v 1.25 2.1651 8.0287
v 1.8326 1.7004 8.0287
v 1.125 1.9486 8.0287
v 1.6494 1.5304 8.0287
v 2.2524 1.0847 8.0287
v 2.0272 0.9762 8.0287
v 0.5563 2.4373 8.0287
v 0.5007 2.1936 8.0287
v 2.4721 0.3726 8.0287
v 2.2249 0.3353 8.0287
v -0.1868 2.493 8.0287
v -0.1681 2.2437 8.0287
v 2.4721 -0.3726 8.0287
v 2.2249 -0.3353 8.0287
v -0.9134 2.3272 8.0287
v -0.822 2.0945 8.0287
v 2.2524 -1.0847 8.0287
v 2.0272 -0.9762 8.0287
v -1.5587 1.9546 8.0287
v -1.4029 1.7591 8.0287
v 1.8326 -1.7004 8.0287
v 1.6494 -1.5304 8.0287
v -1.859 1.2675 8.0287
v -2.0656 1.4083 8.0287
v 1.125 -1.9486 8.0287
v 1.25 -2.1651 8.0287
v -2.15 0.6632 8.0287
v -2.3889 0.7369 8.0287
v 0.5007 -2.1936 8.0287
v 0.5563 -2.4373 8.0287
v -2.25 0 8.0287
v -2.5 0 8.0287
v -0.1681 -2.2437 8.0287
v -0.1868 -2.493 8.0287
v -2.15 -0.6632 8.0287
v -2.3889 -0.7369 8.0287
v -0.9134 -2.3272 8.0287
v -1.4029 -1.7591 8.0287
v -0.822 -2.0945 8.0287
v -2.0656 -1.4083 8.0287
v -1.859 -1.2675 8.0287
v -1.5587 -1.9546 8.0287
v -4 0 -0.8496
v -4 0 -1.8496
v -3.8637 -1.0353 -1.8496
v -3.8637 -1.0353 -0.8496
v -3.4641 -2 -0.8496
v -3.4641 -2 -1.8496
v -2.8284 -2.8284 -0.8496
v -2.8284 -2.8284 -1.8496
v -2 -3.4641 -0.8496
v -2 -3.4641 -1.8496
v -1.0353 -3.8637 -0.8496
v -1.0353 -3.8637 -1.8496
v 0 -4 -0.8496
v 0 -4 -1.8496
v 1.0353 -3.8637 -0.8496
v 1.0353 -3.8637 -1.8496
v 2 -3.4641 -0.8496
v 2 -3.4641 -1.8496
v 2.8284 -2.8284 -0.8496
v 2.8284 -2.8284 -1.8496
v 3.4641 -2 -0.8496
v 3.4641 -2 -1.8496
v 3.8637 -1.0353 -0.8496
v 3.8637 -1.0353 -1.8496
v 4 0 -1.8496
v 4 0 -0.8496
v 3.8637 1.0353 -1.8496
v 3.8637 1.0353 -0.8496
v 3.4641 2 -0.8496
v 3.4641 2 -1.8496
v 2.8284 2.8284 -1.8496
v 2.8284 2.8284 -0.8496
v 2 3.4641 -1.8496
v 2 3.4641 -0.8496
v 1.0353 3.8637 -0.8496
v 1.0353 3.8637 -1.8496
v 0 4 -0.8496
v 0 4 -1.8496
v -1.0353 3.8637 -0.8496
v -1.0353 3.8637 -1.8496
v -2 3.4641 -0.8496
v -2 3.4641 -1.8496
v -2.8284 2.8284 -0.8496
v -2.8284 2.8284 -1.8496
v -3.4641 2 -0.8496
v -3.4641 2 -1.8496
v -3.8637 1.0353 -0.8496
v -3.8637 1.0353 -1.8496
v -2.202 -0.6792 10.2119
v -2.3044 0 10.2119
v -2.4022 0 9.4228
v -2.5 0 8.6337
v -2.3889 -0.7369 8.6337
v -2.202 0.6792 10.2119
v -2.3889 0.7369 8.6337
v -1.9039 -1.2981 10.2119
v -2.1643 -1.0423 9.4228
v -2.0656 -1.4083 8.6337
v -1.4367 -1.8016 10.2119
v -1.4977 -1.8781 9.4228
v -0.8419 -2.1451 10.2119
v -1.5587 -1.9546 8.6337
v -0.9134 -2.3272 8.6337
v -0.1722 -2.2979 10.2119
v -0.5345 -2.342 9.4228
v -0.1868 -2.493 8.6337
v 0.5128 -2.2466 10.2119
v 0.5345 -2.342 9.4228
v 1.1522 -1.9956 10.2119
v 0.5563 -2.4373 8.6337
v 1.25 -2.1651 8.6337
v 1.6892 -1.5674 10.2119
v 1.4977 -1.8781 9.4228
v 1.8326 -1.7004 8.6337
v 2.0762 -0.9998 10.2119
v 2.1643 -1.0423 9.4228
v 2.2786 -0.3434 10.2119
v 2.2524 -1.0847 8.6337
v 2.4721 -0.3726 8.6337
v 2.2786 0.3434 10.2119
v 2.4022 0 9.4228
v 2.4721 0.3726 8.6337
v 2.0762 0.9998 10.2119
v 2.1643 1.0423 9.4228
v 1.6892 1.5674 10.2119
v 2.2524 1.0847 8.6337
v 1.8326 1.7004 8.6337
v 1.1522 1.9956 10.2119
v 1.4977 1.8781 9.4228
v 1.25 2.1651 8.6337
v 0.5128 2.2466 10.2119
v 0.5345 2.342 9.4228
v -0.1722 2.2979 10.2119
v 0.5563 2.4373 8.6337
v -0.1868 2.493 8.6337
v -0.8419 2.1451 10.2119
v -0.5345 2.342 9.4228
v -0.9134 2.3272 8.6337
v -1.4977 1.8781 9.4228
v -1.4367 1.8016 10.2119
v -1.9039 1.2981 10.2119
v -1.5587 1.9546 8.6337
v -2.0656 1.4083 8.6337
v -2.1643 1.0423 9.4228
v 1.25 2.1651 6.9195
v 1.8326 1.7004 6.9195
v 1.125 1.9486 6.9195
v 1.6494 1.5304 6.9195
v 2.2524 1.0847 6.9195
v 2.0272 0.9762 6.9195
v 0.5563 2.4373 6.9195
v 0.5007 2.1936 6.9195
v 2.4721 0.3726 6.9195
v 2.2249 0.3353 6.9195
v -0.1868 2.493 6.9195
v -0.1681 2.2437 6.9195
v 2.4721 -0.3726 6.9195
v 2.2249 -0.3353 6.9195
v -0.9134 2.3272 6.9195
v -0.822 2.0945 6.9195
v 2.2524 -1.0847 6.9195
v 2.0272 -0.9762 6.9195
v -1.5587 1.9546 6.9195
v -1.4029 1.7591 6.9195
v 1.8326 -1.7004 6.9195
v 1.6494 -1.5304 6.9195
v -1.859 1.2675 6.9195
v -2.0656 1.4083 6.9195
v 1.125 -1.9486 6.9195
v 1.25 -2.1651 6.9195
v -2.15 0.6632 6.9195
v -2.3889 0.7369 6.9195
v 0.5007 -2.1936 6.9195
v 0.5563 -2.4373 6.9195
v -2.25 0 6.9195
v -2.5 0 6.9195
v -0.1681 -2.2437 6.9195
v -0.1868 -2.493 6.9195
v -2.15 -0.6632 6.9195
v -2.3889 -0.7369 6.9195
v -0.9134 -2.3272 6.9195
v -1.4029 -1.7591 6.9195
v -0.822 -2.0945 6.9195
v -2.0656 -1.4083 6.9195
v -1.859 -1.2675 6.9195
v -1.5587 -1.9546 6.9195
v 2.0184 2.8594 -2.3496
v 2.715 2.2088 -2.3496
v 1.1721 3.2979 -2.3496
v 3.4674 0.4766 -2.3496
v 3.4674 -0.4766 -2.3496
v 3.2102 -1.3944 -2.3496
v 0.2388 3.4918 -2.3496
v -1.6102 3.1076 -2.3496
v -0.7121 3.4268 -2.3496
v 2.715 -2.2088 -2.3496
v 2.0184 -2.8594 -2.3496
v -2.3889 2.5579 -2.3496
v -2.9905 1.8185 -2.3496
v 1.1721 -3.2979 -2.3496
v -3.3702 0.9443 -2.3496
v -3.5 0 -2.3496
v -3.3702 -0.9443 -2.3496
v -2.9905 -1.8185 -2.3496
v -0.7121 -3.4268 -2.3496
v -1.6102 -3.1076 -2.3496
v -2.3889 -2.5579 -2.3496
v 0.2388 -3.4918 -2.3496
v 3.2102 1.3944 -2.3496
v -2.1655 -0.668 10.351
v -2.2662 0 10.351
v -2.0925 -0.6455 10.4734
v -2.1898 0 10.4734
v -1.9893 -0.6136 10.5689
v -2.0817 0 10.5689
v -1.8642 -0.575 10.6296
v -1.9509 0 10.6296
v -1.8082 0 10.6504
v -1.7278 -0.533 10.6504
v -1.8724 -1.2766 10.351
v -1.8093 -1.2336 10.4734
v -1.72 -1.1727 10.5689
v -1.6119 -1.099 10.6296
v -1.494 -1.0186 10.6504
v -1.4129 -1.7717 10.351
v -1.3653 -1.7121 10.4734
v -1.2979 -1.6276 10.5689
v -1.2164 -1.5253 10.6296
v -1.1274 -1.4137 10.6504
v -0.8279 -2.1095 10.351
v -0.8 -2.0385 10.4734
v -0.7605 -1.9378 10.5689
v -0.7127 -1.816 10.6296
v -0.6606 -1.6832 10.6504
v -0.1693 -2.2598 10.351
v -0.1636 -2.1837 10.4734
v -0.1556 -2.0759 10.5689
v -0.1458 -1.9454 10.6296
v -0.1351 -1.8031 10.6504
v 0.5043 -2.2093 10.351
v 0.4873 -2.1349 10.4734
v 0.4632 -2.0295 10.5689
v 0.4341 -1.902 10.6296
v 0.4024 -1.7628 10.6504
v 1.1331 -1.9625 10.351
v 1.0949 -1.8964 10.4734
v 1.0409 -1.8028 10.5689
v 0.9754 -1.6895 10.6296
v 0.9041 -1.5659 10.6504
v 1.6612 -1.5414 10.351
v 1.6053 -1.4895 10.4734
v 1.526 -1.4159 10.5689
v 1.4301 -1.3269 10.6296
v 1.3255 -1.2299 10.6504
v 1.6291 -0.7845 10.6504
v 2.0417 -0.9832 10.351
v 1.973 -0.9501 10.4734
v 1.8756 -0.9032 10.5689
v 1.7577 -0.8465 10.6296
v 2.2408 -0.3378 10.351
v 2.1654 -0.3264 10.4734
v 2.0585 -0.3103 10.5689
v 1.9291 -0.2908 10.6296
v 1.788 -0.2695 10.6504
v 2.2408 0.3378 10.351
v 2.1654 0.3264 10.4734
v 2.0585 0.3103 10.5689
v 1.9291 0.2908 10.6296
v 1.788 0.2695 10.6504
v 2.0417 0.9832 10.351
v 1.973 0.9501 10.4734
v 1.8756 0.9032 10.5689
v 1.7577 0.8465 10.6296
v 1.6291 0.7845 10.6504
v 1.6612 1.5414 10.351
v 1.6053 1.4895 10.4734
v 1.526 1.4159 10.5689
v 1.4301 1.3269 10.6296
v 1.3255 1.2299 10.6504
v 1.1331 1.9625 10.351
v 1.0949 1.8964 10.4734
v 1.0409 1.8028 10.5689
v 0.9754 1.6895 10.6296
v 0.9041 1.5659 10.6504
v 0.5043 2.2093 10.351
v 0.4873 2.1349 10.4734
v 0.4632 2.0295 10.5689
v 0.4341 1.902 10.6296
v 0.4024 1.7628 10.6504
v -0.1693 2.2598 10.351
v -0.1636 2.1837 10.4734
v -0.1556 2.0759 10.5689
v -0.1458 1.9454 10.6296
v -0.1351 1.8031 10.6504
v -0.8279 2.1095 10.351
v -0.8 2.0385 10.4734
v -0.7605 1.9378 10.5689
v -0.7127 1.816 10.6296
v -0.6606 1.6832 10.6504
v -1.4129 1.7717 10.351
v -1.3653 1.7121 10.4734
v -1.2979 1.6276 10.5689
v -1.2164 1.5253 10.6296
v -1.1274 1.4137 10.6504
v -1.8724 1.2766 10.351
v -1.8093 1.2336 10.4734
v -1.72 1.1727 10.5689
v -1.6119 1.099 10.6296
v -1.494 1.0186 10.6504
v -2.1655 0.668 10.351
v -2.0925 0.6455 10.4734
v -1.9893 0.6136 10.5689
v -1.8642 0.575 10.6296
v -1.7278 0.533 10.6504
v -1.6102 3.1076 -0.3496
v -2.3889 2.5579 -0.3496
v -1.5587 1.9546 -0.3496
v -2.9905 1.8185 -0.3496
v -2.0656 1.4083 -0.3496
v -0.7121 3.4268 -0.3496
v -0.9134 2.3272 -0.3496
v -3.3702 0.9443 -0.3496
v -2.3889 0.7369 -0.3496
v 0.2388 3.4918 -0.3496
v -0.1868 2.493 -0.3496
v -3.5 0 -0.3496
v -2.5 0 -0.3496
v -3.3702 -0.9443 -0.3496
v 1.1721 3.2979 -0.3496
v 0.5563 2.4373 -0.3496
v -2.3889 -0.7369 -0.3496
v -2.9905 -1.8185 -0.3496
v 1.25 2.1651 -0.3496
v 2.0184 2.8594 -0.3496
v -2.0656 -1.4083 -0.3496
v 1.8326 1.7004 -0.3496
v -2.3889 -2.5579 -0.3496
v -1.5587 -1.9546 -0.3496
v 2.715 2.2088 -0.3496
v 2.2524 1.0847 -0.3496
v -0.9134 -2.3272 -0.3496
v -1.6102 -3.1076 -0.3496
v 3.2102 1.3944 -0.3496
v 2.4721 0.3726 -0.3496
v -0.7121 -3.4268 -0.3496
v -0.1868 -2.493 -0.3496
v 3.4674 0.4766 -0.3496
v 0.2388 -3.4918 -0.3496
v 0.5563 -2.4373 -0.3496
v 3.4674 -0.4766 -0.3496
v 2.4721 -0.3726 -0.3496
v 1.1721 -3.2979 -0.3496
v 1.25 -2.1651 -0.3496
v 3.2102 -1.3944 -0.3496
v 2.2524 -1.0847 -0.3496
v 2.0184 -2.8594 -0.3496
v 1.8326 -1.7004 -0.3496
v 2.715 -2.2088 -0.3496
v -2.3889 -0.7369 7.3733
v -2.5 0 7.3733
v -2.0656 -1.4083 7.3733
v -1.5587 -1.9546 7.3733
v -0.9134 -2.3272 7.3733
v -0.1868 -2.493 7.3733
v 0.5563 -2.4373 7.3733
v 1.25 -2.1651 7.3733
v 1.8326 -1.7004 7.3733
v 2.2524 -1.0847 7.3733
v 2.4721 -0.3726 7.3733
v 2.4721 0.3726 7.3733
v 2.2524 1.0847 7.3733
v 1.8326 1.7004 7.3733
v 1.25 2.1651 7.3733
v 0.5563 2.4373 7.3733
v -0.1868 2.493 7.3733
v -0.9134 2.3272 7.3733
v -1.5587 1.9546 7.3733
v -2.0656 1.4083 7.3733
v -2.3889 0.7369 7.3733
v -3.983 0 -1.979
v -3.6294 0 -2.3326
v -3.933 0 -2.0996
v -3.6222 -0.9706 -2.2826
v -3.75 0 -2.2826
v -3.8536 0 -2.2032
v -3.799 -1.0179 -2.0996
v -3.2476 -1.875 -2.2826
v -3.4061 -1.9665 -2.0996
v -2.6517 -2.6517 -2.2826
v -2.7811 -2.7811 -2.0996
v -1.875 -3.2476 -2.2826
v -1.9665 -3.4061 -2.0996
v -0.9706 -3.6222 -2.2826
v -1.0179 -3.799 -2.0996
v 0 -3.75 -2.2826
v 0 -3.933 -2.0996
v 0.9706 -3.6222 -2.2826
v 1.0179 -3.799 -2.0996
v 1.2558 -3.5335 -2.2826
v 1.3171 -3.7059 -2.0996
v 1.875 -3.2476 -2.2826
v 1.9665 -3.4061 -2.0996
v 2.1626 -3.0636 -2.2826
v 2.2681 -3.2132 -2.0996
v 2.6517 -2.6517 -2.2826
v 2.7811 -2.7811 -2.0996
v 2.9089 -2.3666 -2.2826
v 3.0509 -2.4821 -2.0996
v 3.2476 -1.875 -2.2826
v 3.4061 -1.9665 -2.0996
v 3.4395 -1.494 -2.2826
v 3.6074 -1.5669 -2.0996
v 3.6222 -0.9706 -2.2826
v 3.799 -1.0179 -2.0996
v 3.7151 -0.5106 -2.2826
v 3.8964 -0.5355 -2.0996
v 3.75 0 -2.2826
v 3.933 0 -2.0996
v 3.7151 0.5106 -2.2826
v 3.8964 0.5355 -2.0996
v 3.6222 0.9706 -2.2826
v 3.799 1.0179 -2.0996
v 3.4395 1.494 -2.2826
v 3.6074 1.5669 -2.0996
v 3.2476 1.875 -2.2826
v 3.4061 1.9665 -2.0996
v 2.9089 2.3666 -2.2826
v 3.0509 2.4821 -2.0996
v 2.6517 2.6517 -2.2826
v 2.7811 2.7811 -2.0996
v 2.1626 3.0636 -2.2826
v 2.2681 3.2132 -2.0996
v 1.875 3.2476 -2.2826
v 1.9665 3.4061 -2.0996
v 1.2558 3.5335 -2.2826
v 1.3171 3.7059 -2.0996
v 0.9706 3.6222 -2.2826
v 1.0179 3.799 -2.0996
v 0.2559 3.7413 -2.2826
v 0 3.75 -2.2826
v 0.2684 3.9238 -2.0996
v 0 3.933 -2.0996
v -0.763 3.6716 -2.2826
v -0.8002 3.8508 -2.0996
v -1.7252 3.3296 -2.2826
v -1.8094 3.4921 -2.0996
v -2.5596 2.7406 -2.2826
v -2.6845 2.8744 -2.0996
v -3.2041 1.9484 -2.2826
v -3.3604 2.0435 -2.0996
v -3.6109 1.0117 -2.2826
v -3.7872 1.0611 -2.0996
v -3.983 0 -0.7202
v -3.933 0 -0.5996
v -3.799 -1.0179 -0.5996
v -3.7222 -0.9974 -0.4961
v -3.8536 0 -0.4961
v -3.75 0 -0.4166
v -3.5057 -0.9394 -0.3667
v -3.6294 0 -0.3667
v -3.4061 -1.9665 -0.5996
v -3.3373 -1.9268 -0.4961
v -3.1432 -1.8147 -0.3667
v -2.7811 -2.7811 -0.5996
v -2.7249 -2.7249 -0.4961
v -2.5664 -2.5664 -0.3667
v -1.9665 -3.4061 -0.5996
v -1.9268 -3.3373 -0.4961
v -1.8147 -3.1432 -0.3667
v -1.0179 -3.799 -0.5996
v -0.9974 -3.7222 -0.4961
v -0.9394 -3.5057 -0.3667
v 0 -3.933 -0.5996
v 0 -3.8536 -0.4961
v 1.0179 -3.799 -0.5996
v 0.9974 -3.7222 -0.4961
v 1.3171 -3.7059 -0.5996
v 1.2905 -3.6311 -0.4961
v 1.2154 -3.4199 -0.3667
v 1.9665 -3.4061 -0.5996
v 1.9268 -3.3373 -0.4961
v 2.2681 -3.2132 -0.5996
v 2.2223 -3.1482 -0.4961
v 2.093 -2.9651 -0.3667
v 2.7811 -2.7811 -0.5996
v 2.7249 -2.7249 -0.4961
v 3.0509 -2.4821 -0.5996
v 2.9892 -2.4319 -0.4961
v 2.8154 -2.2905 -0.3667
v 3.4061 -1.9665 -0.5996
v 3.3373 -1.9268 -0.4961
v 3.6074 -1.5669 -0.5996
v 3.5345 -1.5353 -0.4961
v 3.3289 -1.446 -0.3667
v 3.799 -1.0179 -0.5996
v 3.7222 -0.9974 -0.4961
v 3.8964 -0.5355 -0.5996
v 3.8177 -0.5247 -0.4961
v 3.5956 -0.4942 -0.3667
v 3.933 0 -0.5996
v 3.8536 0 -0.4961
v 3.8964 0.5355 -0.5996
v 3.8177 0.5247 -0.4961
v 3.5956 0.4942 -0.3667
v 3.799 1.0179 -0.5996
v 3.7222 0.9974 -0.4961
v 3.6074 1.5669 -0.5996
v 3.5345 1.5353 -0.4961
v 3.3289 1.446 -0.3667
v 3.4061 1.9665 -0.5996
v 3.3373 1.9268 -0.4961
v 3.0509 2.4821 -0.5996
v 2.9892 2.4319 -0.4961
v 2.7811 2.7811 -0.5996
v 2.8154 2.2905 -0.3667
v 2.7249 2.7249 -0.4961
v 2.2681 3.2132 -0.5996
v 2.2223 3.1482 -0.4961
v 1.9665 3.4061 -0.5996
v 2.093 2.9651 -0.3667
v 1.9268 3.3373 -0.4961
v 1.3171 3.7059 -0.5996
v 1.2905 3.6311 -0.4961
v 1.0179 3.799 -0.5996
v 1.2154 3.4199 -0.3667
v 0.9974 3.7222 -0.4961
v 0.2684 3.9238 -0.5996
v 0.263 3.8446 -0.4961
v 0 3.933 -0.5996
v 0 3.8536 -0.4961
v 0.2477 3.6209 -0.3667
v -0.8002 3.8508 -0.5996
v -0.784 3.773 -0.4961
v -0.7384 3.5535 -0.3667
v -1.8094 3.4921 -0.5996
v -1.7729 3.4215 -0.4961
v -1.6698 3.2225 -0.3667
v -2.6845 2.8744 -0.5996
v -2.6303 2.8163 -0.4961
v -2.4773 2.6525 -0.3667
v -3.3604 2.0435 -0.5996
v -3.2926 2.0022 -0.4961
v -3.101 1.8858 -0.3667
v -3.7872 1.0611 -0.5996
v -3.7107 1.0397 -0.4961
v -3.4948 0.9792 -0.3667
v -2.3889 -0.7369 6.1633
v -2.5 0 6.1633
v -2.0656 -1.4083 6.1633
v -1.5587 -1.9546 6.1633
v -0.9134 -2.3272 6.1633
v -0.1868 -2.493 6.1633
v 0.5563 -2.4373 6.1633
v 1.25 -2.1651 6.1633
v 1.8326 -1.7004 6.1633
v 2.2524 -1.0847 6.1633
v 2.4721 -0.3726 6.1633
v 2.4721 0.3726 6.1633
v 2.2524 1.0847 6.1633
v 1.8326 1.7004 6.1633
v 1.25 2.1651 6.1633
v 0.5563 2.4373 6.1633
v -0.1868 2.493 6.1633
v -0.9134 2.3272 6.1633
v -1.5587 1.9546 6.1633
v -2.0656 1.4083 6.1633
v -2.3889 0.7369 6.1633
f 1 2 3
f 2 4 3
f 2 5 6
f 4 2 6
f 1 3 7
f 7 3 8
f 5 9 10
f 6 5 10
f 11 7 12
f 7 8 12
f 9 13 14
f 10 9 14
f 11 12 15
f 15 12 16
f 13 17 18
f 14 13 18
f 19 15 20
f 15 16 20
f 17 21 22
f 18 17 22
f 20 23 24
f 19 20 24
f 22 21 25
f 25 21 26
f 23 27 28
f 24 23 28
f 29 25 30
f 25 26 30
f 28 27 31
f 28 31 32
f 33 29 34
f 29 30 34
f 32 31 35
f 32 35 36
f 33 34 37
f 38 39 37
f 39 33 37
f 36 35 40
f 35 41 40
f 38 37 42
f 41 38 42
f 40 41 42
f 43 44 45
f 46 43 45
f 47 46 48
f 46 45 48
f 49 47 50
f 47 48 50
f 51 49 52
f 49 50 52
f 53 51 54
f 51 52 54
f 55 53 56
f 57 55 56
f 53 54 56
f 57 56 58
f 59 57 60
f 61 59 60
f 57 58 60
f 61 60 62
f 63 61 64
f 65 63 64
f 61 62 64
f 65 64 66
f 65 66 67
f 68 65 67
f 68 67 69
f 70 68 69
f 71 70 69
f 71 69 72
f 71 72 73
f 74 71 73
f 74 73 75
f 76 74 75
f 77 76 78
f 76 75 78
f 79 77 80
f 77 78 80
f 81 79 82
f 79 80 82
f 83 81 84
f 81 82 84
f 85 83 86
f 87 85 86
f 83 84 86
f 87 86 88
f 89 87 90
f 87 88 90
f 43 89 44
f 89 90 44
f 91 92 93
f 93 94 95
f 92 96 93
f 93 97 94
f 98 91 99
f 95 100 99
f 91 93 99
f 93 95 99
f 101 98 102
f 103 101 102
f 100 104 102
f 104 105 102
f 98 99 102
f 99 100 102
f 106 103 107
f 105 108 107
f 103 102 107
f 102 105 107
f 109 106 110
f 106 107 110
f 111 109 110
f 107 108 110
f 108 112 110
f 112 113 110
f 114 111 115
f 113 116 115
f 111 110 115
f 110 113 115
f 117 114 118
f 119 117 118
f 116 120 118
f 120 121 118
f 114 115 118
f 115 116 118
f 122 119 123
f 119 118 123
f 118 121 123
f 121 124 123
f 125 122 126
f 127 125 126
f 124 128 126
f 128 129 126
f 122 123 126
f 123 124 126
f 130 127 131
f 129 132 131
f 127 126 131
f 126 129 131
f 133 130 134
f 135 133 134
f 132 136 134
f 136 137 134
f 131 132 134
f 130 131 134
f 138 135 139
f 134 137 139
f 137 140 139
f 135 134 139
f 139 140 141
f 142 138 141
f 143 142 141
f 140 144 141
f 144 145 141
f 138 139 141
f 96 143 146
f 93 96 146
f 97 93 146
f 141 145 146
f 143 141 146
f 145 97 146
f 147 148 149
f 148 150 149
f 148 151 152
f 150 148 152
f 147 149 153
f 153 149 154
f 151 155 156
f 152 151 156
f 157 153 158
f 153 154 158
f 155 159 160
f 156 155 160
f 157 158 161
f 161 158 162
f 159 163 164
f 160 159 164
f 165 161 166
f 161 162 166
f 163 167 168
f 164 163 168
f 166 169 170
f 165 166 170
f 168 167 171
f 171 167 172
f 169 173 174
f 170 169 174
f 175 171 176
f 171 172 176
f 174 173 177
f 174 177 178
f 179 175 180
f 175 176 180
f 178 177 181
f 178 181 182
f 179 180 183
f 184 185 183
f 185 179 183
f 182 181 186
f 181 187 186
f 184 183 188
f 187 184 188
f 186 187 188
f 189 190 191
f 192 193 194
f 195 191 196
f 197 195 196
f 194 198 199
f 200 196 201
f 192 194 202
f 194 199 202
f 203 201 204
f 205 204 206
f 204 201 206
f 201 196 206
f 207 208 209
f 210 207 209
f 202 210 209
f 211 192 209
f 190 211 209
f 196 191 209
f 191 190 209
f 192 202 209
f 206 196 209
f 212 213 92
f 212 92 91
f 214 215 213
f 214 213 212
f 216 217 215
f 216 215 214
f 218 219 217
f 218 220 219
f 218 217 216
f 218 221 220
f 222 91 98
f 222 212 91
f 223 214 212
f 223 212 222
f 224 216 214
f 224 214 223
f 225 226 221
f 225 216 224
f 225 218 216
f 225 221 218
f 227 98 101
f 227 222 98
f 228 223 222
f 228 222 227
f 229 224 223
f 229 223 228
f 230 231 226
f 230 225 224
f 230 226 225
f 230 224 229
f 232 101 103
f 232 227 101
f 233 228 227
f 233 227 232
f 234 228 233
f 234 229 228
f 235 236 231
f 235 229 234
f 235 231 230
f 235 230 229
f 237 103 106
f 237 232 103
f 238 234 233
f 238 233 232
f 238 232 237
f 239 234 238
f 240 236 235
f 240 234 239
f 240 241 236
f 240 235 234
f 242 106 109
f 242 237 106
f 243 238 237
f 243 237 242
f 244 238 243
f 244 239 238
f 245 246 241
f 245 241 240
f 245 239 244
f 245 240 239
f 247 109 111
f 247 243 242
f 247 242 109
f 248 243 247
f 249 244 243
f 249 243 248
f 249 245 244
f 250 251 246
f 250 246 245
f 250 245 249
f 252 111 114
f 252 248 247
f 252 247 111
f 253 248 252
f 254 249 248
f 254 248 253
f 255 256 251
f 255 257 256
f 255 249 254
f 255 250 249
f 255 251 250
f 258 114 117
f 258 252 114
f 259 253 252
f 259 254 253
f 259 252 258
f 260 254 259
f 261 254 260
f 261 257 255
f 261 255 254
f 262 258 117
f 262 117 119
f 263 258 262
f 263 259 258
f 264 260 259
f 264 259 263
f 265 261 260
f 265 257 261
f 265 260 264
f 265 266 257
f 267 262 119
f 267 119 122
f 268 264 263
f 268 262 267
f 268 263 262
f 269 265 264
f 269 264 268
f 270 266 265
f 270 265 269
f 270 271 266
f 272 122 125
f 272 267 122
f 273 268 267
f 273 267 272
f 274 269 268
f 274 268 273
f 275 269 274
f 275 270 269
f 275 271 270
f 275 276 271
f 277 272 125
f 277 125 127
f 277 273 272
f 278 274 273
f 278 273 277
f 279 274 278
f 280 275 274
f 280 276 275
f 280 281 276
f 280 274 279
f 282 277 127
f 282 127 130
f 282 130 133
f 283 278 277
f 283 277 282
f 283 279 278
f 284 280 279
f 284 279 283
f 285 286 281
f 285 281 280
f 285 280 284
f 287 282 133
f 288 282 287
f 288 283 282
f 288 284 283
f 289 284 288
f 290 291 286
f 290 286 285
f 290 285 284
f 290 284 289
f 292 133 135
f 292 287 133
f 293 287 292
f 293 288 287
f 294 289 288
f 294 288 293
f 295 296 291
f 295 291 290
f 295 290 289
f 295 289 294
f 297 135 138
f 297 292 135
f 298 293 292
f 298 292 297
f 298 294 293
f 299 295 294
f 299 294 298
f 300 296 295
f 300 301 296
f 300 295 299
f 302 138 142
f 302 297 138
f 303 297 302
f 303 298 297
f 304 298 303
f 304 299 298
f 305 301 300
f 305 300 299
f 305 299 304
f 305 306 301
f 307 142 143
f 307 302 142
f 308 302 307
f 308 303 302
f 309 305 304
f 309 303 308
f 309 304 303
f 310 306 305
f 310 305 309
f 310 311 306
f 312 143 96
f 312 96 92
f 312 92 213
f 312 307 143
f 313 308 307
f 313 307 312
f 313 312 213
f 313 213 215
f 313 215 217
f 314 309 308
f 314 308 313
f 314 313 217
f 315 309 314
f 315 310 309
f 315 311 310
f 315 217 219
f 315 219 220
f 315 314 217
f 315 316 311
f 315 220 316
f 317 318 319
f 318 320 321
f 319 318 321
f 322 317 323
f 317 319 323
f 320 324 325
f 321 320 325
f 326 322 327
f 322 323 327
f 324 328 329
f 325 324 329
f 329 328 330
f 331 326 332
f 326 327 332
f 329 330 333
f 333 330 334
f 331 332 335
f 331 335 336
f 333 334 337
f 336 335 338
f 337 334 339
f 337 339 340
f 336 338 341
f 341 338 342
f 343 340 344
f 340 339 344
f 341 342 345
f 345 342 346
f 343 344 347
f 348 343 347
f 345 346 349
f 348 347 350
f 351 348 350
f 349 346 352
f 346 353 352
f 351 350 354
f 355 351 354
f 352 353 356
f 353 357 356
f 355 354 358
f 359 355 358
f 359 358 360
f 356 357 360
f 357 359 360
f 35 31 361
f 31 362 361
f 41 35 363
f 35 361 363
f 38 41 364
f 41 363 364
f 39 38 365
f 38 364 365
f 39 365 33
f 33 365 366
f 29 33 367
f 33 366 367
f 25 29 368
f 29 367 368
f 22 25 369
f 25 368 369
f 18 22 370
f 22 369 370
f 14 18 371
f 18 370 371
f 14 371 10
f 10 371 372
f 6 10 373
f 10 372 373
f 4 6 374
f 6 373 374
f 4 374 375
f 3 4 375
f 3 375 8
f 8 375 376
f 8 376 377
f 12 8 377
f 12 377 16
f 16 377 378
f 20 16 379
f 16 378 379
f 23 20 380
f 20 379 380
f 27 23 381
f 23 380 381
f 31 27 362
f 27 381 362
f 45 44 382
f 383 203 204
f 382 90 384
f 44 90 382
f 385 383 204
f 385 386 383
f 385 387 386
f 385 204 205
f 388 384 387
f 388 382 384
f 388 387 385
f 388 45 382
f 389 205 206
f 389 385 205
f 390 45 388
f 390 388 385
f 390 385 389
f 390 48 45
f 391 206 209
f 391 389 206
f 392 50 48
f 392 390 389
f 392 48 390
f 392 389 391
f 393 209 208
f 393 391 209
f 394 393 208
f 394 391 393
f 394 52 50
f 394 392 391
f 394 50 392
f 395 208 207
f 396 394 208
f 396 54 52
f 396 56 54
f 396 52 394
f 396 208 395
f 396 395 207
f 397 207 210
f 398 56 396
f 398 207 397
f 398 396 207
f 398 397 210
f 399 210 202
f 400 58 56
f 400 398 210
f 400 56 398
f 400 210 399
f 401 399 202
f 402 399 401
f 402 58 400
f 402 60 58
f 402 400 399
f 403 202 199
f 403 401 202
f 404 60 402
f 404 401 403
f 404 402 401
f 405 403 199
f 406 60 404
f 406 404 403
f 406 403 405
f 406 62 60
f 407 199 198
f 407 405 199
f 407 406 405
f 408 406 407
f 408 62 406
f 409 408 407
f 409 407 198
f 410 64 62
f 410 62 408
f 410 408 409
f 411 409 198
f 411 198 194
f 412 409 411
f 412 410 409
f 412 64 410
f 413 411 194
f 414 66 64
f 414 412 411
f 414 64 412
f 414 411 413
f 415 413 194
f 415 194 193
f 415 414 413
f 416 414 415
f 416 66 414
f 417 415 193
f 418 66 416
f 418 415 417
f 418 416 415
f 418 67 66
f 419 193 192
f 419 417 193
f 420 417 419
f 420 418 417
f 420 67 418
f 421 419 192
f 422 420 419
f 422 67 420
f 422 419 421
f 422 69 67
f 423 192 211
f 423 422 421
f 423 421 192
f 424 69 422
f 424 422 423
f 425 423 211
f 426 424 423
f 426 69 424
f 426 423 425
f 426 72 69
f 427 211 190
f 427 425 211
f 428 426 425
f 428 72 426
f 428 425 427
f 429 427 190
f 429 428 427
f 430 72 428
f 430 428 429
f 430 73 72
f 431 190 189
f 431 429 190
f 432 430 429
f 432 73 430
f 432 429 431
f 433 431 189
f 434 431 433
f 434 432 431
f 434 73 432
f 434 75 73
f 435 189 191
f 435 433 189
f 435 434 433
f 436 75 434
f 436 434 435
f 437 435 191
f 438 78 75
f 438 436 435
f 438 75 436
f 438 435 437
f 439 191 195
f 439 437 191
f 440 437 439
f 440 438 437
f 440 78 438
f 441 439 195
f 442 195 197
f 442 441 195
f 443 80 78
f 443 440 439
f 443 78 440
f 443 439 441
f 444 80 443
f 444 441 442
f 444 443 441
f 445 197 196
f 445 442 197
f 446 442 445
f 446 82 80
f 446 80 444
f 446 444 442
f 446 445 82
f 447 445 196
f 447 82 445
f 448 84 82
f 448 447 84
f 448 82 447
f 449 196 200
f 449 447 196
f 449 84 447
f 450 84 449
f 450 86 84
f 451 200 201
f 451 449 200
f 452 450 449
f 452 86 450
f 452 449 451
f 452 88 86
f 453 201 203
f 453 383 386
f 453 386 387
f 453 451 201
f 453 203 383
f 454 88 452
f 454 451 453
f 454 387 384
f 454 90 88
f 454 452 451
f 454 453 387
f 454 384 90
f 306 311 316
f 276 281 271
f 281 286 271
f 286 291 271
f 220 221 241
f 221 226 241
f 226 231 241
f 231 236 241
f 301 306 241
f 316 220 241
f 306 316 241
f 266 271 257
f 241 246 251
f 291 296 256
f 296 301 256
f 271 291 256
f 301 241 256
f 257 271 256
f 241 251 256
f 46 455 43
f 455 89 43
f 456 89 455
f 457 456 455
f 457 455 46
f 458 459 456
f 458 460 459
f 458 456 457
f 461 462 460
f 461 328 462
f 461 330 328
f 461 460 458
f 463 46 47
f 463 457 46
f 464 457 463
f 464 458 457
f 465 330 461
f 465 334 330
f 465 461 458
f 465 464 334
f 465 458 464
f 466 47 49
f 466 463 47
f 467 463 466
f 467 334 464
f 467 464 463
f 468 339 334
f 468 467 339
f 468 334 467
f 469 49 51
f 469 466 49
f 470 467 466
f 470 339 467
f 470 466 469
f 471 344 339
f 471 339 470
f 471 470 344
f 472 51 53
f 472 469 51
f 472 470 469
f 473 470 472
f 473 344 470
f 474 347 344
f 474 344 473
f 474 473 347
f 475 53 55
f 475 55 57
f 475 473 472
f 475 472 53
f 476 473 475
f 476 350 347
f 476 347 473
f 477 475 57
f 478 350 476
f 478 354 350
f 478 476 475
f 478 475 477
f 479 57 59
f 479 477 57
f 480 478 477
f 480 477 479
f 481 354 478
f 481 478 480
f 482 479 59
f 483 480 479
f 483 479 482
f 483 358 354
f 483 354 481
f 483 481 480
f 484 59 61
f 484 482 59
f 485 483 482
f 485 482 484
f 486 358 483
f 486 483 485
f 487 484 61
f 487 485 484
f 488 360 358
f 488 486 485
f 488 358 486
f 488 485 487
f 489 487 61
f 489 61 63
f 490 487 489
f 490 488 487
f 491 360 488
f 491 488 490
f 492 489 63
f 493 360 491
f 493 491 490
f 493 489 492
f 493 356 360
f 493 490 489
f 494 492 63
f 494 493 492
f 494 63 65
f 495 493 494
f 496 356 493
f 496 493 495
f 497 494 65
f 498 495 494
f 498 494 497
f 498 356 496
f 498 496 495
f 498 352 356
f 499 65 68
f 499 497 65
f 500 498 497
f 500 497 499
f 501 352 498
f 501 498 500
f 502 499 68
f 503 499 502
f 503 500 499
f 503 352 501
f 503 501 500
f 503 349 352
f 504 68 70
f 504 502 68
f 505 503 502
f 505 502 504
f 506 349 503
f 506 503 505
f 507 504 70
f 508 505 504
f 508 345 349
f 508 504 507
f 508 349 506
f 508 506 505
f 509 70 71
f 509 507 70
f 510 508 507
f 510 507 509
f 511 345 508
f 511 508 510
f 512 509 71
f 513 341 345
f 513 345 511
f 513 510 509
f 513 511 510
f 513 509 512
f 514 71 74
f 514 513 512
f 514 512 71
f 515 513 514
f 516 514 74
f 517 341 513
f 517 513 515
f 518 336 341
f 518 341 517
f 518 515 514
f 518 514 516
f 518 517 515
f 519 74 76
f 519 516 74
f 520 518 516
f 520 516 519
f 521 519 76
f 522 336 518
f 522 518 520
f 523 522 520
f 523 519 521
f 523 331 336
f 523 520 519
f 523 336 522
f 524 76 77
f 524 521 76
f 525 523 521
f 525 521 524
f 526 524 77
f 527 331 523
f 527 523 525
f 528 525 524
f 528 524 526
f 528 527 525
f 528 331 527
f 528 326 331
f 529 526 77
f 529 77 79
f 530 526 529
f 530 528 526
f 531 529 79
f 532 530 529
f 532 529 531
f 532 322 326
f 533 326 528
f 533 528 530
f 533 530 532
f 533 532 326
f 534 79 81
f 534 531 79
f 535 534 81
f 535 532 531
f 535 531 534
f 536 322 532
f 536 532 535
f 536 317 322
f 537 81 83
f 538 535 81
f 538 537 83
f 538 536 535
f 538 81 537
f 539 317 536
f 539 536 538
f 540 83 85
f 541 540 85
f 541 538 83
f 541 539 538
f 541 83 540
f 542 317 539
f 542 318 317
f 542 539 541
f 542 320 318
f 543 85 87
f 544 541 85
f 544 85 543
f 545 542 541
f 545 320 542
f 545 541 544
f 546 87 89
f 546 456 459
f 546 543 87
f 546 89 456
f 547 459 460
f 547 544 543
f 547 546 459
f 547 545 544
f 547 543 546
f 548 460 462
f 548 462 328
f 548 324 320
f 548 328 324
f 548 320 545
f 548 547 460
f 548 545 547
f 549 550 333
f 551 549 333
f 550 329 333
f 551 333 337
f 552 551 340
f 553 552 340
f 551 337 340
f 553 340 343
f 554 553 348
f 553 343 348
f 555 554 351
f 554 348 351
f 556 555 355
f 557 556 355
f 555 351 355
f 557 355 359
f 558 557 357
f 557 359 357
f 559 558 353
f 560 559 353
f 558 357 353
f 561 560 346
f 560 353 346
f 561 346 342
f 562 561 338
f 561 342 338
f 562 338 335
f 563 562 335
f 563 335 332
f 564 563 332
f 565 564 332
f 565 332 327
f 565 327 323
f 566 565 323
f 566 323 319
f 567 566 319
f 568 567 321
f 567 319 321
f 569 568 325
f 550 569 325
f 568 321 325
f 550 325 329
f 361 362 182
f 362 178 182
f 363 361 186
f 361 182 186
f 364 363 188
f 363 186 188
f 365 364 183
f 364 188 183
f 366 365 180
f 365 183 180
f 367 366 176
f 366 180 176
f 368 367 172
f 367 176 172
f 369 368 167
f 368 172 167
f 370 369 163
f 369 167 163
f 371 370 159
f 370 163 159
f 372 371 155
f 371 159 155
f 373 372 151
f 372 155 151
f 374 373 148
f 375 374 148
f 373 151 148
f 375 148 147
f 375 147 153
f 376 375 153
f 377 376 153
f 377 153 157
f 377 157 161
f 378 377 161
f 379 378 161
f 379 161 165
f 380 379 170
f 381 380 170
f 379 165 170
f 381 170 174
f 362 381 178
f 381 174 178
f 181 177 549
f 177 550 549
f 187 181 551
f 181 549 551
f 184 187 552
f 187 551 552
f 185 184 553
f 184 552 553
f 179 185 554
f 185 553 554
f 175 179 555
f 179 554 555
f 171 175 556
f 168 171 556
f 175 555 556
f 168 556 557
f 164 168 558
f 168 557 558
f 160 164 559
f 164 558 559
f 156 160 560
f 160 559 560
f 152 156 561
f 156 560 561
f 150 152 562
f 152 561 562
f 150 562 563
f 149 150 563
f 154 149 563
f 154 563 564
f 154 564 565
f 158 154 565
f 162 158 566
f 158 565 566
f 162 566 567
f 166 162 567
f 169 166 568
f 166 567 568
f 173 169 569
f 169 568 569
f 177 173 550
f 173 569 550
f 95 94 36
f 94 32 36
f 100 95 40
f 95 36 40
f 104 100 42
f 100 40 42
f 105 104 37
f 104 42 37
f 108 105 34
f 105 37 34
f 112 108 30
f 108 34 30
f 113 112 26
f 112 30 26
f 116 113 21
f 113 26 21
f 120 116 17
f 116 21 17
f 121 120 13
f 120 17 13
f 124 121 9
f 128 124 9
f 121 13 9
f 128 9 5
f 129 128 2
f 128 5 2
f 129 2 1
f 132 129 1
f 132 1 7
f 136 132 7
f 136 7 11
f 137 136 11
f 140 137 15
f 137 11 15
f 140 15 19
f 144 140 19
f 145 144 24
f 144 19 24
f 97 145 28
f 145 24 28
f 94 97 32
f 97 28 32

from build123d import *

# Parameters (mm, degrees)
F2_R = 0.5
F3_R = 0.5


with BuildPart() as f1:
    # F0 (on Front) → F1 (revolve)
    with BuildSketch(Plane.XZ):
        Polygon((-4, -2.349634), (0, -2.349634), (0, 10.650366), (-2.25, 10.650366), (-2.5, 8.6337), (-2.5, 8.0287), (-2.25, 8.0287), (-2.5, 7.373284), (-2.5, 6.919534), (-2.25, 6.919534), (-2.5, 6.163284), (-2.5, -0.349634), (-4, -0.349634), align=None)
    revolve(axis=Axis((0, 0, 3.269001), (0, 0, 1)))

    # F2
    f2_edges = [f1.edges().sort_by_distance(p)[0] for p in [
        (4, 0, -2.349634),
    ]]
    fillet(f2_edges, radius=F2_R)

    # F3
    f3_edges = [f1.edges().sort_by_distance(p)[0] for p in [
        (2.25, 0, 10.650366),
        (4, 0, -0.349634),
    ]]
    fillet(f3_edges, radius=F3_R)


solid = f1.part
